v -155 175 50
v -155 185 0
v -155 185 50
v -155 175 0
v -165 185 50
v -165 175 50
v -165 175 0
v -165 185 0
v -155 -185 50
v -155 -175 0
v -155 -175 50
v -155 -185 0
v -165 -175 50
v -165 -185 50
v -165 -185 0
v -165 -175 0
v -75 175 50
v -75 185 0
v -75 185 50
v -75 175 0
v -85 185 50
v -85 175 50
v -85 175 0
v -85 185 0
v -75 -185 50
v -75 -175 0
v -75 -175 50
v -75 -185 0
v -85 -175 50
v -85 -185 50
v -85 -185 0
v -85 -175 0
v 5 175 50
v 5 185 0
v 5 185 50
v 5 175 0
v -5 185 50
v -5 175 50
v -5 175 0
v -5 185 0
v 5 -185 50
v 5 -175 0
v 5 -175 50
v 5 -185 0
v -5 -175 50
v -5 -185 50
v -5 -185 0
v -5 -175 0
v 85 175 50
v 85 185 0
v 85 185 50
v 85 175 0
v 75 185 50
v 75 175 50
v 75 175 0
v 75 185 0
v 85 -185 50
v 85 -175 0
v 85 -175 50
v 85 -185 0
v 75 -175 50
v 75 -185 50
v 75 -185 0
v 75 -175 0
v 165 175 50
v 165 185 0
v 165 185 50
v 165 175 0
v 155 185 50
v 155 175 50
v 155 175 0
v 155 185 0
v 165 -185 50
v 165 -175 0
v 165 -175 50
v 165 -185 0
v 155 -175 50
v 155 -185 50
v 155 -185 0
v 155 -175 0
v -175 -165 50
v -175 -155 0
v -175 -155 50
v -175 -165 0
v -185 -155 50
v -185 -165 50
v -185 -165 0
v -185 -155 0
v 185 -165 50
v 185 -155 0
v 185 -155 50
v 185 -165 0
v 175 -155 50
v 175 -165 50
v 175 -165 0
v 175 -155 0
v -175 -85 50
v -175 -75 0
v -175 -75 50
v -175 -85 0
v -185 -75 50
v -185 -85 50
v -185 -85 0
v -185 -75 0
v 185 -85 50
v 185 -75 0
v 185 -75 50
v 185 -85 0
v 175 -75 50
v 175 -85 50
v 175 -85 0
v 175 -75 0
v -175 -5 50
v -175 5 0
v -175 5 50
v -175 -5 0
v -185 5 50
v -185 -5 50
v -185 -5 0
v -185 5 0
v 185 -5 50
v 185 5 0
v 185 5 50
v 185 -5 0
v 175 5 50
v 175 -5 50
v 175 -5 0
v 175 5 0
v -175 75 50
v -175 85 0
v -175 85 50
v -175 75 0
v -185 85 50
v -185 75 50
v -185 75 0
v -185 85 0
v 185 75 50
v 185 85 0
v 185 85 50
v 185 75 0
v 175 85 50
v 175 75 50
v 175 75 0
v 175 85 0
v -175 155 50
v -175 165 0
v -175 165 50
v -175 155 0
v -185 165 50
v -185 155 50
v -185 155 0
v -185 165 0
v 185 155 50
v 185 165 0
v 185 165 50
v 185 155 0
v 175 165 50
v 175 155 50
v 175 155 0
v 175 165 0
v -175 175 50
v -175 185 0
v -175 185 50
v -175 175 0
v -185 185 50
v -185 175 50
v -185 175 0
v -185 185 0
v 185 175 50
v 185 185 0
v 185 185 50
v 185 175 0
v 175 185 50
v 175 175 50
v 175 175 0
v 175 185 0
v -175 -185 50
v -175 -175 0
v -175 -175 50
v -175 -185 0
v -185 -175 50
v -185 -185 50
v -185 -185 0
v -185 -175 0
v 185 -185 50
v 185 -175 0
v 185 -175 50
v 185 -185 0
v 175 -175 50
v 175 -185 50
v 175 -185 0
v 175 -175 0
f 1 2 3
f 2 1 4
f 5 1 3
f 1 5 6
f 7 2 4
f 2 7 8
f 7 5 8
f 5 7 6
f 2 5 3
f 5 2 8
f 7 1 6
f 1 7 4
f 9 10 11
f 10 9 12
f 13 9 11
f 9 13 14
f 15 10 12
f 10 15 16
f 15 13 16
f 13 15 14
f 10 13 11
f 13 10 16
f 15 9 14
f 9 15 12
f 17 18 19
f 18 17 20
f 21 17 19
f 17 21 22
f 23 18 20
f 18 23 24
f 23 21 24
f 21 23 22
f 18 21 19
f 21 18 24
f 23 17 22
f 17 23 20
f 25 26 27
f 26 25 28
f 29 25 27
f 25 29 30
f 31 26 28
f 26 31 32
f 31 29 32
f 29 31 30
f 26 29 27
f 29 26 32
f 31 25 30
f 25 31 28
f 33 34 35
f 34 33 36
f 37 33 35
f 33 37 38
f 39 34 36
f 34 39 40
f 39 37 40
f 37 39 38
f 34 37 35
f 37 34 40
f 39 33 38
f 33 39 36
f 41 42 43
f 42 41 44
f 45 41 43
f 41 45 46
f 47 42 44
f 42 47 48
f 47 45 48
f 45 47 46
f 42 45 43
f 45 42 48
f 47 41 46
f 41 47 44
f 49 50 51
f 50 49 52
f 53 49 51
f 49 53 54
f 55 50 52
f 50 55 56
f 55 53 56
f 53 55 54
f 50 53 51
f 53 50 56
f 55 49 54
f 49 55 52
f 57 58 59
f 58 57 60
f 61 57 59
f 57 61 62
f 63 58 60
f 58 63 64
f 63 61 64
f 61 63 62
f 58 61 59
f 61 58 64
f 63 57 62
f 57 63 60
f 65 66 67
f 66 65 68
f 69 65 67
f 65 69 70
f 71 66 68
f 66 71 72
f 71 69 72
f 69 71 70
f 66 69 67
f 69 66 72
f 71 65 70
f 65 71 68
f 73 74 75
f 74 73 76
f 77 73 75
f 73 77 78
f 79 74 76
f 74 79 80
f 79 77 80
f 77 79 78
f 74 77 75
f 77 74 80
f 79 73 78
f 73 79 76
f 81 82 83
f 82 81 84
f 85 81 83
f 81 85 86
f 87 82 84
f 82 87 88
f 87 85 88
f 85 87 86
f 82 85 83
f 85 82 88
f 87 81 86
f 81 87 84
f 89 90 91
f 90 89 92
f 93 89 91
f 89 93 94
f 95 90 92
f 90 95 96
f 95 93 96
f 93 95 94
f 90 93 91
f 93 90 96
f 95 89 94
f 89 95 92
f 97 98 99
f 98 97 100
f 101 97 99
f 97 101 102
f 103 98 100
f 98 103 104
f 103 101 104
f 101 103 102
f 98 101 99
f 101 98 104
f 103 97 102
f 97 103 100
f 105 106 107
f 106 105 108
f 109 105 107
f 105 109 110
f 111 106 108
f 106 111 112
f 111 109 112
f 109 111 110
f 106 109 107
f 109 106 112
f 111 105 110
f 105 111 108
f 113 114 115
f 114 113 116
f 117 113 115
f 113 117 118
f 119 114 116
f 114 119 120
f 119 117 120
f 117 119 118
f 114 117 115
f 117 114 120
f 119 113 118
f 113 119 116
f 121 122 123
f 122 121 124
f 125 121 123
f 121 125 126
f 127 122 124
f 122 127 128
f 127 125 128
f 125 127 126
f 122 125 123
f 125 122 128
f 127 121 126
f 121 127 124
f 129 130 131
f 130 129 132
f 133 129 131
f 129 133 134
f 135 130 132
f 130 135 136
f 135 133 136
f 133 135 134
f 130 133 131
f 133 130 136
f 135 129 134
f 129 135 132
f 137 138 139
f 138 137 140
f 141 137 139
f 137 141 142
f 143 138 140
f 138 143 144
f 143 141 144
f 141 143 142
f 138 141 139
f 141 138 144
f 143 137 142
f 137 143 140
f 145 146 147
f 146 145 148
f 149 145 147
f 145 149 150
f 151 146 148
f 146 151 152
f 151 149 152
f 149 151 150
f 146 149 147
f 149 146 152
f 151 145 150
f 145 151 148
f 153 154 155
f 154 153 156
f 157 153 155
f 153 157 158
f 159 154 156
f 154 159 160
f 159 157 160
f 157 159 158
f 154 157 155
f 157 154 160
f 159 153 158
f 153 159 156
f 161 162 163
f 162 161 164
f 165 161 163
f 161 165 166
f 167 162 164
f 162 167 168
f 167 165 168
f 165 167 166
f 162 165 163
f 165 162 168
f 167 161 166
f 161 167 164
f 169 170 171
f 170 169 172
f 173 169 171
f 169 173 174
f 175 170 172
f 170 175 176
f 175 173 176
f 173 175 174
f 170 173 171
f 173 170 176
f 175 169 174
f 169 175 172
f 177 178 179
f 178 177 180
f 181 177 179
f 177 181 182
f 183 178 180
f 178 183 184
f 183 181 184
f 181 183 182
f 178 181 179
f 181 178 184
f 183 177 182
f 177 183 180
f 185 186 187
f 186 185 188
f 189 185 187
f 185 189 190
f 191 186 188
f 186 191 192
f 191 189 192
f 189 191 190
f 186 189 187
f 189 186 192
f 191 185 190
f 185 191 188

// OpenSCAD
// Cage slice 7
// Internal cavity: 350 x 350 x 700 mm
// Bar thickness: 10 mm (square)
// Gap between bars: 70 mm (uniform)
// Slice index: 7, slice Z range: [350, 400] (local coordinates 0..50)
// This file places the slice with its bottom on Z=0; when assembling, translate in Z by 350 mm.
// Export to STL with OpenSCAD: Render -> Export as STL.

bar = 10;
gap = 70;
s = bar + gap;
$fn = 64;  // cylinder resolution

x_centers = [-160, -80, 0, 80, 160];
y_centers = [-160, -80, 0, 80, 160];
z_centers = [5, 85, 165, 245, 325, 405, 485, 565, 645];

slice_index = 7;
slice_h = 50;

front_y = 180;
back_y = -180;
left_x = -180;
right_x = 180;
panel_length = 370;

hole_diam = 6.6;

module slice() {
    union() {
        // vertical bars on front and back (along Z)
        for (x = x_centers) {
            translate([x, front_y, slice_h/2]) cube([bar, bar, slice_h], center=true);
            translate([x, back_y, slice_h/2])  cube([bar, bar, slice_h], center=true);
        }
        // vertical bars on left and right (along Z)
        for (y = y_centers) {
            translate([left_x, y, slice_h/2])  cube([bar, bar, slice_h], center=true);
            translate([right_x, y, slice_h/2]) cube([bar, bar, slice_h], center=true);
        }
        // explicit corner vertical bars (ensure 4 corners for M6 rods)
        translate([-180, 180, slice_h/2]) cube([bar, bar, slice_h], center=true);
        translate([180, 180, slice_h/2]) cube([bar, bar, slice_h], center=true);
        translate([-180, -180, slice_h/2]) cube([bar, bar, slice_h], center=true);
        translate([180, -180, slice_h/2]) cube([bar, bar, slice_h], center=true);

        // horizontal bars (10 mm thick in Z) that lie inside this slice
        for (zc = z_centers) {
            z_local = zc - slice_index*slice_h;
            // include this horizontal bar if its center lies within this slice and it fits entirely here
            if (z_local >= bar/2 && z_local <= slice_h - bar/2) {
                // front and back horizontal bars (run along X)
                translate([0, front_y, z_local]) cube([panel_length, bar, bar], center=true);
                translate([0, back_y,  z_local]) cube([panel_length, bar, bar], center=true);
                // left and right horizontal bars (run along Y)
                translate([left_x, 0, z_local]) cube([bar, panel_length, bar], center=true);
                translate([right_x,0, z_local]) cube([bar, panel_length, bar], center=true);
            }
        }
    }
}

difference() {
    slice();
    // four vertical holes for M6 rods through corner bars (slightly longer than slice to ensure clean subtraction)
    translate([-180, 180, slice_h/2]) rotate([0,0,0]) cylinder(h = slice_h*4, r = hole_diam/2, center=true);
    translate([180, 180, slice_h/2]) rotate([0,0,0]) cylinder(h = slice_h*4, r = hole_diam/2, center=true);
    translate([-180, -180, slice_h/2]) rotate([0,0,0]) cylinder(h = slice_h*4, r = hole_diam/2, center=true);
    translate([180, -180, slice_h/2]) rotate([0,0,0]) cylinder(h = slice_h*4, r = hole_diam/2, center=true);
}

slice();
